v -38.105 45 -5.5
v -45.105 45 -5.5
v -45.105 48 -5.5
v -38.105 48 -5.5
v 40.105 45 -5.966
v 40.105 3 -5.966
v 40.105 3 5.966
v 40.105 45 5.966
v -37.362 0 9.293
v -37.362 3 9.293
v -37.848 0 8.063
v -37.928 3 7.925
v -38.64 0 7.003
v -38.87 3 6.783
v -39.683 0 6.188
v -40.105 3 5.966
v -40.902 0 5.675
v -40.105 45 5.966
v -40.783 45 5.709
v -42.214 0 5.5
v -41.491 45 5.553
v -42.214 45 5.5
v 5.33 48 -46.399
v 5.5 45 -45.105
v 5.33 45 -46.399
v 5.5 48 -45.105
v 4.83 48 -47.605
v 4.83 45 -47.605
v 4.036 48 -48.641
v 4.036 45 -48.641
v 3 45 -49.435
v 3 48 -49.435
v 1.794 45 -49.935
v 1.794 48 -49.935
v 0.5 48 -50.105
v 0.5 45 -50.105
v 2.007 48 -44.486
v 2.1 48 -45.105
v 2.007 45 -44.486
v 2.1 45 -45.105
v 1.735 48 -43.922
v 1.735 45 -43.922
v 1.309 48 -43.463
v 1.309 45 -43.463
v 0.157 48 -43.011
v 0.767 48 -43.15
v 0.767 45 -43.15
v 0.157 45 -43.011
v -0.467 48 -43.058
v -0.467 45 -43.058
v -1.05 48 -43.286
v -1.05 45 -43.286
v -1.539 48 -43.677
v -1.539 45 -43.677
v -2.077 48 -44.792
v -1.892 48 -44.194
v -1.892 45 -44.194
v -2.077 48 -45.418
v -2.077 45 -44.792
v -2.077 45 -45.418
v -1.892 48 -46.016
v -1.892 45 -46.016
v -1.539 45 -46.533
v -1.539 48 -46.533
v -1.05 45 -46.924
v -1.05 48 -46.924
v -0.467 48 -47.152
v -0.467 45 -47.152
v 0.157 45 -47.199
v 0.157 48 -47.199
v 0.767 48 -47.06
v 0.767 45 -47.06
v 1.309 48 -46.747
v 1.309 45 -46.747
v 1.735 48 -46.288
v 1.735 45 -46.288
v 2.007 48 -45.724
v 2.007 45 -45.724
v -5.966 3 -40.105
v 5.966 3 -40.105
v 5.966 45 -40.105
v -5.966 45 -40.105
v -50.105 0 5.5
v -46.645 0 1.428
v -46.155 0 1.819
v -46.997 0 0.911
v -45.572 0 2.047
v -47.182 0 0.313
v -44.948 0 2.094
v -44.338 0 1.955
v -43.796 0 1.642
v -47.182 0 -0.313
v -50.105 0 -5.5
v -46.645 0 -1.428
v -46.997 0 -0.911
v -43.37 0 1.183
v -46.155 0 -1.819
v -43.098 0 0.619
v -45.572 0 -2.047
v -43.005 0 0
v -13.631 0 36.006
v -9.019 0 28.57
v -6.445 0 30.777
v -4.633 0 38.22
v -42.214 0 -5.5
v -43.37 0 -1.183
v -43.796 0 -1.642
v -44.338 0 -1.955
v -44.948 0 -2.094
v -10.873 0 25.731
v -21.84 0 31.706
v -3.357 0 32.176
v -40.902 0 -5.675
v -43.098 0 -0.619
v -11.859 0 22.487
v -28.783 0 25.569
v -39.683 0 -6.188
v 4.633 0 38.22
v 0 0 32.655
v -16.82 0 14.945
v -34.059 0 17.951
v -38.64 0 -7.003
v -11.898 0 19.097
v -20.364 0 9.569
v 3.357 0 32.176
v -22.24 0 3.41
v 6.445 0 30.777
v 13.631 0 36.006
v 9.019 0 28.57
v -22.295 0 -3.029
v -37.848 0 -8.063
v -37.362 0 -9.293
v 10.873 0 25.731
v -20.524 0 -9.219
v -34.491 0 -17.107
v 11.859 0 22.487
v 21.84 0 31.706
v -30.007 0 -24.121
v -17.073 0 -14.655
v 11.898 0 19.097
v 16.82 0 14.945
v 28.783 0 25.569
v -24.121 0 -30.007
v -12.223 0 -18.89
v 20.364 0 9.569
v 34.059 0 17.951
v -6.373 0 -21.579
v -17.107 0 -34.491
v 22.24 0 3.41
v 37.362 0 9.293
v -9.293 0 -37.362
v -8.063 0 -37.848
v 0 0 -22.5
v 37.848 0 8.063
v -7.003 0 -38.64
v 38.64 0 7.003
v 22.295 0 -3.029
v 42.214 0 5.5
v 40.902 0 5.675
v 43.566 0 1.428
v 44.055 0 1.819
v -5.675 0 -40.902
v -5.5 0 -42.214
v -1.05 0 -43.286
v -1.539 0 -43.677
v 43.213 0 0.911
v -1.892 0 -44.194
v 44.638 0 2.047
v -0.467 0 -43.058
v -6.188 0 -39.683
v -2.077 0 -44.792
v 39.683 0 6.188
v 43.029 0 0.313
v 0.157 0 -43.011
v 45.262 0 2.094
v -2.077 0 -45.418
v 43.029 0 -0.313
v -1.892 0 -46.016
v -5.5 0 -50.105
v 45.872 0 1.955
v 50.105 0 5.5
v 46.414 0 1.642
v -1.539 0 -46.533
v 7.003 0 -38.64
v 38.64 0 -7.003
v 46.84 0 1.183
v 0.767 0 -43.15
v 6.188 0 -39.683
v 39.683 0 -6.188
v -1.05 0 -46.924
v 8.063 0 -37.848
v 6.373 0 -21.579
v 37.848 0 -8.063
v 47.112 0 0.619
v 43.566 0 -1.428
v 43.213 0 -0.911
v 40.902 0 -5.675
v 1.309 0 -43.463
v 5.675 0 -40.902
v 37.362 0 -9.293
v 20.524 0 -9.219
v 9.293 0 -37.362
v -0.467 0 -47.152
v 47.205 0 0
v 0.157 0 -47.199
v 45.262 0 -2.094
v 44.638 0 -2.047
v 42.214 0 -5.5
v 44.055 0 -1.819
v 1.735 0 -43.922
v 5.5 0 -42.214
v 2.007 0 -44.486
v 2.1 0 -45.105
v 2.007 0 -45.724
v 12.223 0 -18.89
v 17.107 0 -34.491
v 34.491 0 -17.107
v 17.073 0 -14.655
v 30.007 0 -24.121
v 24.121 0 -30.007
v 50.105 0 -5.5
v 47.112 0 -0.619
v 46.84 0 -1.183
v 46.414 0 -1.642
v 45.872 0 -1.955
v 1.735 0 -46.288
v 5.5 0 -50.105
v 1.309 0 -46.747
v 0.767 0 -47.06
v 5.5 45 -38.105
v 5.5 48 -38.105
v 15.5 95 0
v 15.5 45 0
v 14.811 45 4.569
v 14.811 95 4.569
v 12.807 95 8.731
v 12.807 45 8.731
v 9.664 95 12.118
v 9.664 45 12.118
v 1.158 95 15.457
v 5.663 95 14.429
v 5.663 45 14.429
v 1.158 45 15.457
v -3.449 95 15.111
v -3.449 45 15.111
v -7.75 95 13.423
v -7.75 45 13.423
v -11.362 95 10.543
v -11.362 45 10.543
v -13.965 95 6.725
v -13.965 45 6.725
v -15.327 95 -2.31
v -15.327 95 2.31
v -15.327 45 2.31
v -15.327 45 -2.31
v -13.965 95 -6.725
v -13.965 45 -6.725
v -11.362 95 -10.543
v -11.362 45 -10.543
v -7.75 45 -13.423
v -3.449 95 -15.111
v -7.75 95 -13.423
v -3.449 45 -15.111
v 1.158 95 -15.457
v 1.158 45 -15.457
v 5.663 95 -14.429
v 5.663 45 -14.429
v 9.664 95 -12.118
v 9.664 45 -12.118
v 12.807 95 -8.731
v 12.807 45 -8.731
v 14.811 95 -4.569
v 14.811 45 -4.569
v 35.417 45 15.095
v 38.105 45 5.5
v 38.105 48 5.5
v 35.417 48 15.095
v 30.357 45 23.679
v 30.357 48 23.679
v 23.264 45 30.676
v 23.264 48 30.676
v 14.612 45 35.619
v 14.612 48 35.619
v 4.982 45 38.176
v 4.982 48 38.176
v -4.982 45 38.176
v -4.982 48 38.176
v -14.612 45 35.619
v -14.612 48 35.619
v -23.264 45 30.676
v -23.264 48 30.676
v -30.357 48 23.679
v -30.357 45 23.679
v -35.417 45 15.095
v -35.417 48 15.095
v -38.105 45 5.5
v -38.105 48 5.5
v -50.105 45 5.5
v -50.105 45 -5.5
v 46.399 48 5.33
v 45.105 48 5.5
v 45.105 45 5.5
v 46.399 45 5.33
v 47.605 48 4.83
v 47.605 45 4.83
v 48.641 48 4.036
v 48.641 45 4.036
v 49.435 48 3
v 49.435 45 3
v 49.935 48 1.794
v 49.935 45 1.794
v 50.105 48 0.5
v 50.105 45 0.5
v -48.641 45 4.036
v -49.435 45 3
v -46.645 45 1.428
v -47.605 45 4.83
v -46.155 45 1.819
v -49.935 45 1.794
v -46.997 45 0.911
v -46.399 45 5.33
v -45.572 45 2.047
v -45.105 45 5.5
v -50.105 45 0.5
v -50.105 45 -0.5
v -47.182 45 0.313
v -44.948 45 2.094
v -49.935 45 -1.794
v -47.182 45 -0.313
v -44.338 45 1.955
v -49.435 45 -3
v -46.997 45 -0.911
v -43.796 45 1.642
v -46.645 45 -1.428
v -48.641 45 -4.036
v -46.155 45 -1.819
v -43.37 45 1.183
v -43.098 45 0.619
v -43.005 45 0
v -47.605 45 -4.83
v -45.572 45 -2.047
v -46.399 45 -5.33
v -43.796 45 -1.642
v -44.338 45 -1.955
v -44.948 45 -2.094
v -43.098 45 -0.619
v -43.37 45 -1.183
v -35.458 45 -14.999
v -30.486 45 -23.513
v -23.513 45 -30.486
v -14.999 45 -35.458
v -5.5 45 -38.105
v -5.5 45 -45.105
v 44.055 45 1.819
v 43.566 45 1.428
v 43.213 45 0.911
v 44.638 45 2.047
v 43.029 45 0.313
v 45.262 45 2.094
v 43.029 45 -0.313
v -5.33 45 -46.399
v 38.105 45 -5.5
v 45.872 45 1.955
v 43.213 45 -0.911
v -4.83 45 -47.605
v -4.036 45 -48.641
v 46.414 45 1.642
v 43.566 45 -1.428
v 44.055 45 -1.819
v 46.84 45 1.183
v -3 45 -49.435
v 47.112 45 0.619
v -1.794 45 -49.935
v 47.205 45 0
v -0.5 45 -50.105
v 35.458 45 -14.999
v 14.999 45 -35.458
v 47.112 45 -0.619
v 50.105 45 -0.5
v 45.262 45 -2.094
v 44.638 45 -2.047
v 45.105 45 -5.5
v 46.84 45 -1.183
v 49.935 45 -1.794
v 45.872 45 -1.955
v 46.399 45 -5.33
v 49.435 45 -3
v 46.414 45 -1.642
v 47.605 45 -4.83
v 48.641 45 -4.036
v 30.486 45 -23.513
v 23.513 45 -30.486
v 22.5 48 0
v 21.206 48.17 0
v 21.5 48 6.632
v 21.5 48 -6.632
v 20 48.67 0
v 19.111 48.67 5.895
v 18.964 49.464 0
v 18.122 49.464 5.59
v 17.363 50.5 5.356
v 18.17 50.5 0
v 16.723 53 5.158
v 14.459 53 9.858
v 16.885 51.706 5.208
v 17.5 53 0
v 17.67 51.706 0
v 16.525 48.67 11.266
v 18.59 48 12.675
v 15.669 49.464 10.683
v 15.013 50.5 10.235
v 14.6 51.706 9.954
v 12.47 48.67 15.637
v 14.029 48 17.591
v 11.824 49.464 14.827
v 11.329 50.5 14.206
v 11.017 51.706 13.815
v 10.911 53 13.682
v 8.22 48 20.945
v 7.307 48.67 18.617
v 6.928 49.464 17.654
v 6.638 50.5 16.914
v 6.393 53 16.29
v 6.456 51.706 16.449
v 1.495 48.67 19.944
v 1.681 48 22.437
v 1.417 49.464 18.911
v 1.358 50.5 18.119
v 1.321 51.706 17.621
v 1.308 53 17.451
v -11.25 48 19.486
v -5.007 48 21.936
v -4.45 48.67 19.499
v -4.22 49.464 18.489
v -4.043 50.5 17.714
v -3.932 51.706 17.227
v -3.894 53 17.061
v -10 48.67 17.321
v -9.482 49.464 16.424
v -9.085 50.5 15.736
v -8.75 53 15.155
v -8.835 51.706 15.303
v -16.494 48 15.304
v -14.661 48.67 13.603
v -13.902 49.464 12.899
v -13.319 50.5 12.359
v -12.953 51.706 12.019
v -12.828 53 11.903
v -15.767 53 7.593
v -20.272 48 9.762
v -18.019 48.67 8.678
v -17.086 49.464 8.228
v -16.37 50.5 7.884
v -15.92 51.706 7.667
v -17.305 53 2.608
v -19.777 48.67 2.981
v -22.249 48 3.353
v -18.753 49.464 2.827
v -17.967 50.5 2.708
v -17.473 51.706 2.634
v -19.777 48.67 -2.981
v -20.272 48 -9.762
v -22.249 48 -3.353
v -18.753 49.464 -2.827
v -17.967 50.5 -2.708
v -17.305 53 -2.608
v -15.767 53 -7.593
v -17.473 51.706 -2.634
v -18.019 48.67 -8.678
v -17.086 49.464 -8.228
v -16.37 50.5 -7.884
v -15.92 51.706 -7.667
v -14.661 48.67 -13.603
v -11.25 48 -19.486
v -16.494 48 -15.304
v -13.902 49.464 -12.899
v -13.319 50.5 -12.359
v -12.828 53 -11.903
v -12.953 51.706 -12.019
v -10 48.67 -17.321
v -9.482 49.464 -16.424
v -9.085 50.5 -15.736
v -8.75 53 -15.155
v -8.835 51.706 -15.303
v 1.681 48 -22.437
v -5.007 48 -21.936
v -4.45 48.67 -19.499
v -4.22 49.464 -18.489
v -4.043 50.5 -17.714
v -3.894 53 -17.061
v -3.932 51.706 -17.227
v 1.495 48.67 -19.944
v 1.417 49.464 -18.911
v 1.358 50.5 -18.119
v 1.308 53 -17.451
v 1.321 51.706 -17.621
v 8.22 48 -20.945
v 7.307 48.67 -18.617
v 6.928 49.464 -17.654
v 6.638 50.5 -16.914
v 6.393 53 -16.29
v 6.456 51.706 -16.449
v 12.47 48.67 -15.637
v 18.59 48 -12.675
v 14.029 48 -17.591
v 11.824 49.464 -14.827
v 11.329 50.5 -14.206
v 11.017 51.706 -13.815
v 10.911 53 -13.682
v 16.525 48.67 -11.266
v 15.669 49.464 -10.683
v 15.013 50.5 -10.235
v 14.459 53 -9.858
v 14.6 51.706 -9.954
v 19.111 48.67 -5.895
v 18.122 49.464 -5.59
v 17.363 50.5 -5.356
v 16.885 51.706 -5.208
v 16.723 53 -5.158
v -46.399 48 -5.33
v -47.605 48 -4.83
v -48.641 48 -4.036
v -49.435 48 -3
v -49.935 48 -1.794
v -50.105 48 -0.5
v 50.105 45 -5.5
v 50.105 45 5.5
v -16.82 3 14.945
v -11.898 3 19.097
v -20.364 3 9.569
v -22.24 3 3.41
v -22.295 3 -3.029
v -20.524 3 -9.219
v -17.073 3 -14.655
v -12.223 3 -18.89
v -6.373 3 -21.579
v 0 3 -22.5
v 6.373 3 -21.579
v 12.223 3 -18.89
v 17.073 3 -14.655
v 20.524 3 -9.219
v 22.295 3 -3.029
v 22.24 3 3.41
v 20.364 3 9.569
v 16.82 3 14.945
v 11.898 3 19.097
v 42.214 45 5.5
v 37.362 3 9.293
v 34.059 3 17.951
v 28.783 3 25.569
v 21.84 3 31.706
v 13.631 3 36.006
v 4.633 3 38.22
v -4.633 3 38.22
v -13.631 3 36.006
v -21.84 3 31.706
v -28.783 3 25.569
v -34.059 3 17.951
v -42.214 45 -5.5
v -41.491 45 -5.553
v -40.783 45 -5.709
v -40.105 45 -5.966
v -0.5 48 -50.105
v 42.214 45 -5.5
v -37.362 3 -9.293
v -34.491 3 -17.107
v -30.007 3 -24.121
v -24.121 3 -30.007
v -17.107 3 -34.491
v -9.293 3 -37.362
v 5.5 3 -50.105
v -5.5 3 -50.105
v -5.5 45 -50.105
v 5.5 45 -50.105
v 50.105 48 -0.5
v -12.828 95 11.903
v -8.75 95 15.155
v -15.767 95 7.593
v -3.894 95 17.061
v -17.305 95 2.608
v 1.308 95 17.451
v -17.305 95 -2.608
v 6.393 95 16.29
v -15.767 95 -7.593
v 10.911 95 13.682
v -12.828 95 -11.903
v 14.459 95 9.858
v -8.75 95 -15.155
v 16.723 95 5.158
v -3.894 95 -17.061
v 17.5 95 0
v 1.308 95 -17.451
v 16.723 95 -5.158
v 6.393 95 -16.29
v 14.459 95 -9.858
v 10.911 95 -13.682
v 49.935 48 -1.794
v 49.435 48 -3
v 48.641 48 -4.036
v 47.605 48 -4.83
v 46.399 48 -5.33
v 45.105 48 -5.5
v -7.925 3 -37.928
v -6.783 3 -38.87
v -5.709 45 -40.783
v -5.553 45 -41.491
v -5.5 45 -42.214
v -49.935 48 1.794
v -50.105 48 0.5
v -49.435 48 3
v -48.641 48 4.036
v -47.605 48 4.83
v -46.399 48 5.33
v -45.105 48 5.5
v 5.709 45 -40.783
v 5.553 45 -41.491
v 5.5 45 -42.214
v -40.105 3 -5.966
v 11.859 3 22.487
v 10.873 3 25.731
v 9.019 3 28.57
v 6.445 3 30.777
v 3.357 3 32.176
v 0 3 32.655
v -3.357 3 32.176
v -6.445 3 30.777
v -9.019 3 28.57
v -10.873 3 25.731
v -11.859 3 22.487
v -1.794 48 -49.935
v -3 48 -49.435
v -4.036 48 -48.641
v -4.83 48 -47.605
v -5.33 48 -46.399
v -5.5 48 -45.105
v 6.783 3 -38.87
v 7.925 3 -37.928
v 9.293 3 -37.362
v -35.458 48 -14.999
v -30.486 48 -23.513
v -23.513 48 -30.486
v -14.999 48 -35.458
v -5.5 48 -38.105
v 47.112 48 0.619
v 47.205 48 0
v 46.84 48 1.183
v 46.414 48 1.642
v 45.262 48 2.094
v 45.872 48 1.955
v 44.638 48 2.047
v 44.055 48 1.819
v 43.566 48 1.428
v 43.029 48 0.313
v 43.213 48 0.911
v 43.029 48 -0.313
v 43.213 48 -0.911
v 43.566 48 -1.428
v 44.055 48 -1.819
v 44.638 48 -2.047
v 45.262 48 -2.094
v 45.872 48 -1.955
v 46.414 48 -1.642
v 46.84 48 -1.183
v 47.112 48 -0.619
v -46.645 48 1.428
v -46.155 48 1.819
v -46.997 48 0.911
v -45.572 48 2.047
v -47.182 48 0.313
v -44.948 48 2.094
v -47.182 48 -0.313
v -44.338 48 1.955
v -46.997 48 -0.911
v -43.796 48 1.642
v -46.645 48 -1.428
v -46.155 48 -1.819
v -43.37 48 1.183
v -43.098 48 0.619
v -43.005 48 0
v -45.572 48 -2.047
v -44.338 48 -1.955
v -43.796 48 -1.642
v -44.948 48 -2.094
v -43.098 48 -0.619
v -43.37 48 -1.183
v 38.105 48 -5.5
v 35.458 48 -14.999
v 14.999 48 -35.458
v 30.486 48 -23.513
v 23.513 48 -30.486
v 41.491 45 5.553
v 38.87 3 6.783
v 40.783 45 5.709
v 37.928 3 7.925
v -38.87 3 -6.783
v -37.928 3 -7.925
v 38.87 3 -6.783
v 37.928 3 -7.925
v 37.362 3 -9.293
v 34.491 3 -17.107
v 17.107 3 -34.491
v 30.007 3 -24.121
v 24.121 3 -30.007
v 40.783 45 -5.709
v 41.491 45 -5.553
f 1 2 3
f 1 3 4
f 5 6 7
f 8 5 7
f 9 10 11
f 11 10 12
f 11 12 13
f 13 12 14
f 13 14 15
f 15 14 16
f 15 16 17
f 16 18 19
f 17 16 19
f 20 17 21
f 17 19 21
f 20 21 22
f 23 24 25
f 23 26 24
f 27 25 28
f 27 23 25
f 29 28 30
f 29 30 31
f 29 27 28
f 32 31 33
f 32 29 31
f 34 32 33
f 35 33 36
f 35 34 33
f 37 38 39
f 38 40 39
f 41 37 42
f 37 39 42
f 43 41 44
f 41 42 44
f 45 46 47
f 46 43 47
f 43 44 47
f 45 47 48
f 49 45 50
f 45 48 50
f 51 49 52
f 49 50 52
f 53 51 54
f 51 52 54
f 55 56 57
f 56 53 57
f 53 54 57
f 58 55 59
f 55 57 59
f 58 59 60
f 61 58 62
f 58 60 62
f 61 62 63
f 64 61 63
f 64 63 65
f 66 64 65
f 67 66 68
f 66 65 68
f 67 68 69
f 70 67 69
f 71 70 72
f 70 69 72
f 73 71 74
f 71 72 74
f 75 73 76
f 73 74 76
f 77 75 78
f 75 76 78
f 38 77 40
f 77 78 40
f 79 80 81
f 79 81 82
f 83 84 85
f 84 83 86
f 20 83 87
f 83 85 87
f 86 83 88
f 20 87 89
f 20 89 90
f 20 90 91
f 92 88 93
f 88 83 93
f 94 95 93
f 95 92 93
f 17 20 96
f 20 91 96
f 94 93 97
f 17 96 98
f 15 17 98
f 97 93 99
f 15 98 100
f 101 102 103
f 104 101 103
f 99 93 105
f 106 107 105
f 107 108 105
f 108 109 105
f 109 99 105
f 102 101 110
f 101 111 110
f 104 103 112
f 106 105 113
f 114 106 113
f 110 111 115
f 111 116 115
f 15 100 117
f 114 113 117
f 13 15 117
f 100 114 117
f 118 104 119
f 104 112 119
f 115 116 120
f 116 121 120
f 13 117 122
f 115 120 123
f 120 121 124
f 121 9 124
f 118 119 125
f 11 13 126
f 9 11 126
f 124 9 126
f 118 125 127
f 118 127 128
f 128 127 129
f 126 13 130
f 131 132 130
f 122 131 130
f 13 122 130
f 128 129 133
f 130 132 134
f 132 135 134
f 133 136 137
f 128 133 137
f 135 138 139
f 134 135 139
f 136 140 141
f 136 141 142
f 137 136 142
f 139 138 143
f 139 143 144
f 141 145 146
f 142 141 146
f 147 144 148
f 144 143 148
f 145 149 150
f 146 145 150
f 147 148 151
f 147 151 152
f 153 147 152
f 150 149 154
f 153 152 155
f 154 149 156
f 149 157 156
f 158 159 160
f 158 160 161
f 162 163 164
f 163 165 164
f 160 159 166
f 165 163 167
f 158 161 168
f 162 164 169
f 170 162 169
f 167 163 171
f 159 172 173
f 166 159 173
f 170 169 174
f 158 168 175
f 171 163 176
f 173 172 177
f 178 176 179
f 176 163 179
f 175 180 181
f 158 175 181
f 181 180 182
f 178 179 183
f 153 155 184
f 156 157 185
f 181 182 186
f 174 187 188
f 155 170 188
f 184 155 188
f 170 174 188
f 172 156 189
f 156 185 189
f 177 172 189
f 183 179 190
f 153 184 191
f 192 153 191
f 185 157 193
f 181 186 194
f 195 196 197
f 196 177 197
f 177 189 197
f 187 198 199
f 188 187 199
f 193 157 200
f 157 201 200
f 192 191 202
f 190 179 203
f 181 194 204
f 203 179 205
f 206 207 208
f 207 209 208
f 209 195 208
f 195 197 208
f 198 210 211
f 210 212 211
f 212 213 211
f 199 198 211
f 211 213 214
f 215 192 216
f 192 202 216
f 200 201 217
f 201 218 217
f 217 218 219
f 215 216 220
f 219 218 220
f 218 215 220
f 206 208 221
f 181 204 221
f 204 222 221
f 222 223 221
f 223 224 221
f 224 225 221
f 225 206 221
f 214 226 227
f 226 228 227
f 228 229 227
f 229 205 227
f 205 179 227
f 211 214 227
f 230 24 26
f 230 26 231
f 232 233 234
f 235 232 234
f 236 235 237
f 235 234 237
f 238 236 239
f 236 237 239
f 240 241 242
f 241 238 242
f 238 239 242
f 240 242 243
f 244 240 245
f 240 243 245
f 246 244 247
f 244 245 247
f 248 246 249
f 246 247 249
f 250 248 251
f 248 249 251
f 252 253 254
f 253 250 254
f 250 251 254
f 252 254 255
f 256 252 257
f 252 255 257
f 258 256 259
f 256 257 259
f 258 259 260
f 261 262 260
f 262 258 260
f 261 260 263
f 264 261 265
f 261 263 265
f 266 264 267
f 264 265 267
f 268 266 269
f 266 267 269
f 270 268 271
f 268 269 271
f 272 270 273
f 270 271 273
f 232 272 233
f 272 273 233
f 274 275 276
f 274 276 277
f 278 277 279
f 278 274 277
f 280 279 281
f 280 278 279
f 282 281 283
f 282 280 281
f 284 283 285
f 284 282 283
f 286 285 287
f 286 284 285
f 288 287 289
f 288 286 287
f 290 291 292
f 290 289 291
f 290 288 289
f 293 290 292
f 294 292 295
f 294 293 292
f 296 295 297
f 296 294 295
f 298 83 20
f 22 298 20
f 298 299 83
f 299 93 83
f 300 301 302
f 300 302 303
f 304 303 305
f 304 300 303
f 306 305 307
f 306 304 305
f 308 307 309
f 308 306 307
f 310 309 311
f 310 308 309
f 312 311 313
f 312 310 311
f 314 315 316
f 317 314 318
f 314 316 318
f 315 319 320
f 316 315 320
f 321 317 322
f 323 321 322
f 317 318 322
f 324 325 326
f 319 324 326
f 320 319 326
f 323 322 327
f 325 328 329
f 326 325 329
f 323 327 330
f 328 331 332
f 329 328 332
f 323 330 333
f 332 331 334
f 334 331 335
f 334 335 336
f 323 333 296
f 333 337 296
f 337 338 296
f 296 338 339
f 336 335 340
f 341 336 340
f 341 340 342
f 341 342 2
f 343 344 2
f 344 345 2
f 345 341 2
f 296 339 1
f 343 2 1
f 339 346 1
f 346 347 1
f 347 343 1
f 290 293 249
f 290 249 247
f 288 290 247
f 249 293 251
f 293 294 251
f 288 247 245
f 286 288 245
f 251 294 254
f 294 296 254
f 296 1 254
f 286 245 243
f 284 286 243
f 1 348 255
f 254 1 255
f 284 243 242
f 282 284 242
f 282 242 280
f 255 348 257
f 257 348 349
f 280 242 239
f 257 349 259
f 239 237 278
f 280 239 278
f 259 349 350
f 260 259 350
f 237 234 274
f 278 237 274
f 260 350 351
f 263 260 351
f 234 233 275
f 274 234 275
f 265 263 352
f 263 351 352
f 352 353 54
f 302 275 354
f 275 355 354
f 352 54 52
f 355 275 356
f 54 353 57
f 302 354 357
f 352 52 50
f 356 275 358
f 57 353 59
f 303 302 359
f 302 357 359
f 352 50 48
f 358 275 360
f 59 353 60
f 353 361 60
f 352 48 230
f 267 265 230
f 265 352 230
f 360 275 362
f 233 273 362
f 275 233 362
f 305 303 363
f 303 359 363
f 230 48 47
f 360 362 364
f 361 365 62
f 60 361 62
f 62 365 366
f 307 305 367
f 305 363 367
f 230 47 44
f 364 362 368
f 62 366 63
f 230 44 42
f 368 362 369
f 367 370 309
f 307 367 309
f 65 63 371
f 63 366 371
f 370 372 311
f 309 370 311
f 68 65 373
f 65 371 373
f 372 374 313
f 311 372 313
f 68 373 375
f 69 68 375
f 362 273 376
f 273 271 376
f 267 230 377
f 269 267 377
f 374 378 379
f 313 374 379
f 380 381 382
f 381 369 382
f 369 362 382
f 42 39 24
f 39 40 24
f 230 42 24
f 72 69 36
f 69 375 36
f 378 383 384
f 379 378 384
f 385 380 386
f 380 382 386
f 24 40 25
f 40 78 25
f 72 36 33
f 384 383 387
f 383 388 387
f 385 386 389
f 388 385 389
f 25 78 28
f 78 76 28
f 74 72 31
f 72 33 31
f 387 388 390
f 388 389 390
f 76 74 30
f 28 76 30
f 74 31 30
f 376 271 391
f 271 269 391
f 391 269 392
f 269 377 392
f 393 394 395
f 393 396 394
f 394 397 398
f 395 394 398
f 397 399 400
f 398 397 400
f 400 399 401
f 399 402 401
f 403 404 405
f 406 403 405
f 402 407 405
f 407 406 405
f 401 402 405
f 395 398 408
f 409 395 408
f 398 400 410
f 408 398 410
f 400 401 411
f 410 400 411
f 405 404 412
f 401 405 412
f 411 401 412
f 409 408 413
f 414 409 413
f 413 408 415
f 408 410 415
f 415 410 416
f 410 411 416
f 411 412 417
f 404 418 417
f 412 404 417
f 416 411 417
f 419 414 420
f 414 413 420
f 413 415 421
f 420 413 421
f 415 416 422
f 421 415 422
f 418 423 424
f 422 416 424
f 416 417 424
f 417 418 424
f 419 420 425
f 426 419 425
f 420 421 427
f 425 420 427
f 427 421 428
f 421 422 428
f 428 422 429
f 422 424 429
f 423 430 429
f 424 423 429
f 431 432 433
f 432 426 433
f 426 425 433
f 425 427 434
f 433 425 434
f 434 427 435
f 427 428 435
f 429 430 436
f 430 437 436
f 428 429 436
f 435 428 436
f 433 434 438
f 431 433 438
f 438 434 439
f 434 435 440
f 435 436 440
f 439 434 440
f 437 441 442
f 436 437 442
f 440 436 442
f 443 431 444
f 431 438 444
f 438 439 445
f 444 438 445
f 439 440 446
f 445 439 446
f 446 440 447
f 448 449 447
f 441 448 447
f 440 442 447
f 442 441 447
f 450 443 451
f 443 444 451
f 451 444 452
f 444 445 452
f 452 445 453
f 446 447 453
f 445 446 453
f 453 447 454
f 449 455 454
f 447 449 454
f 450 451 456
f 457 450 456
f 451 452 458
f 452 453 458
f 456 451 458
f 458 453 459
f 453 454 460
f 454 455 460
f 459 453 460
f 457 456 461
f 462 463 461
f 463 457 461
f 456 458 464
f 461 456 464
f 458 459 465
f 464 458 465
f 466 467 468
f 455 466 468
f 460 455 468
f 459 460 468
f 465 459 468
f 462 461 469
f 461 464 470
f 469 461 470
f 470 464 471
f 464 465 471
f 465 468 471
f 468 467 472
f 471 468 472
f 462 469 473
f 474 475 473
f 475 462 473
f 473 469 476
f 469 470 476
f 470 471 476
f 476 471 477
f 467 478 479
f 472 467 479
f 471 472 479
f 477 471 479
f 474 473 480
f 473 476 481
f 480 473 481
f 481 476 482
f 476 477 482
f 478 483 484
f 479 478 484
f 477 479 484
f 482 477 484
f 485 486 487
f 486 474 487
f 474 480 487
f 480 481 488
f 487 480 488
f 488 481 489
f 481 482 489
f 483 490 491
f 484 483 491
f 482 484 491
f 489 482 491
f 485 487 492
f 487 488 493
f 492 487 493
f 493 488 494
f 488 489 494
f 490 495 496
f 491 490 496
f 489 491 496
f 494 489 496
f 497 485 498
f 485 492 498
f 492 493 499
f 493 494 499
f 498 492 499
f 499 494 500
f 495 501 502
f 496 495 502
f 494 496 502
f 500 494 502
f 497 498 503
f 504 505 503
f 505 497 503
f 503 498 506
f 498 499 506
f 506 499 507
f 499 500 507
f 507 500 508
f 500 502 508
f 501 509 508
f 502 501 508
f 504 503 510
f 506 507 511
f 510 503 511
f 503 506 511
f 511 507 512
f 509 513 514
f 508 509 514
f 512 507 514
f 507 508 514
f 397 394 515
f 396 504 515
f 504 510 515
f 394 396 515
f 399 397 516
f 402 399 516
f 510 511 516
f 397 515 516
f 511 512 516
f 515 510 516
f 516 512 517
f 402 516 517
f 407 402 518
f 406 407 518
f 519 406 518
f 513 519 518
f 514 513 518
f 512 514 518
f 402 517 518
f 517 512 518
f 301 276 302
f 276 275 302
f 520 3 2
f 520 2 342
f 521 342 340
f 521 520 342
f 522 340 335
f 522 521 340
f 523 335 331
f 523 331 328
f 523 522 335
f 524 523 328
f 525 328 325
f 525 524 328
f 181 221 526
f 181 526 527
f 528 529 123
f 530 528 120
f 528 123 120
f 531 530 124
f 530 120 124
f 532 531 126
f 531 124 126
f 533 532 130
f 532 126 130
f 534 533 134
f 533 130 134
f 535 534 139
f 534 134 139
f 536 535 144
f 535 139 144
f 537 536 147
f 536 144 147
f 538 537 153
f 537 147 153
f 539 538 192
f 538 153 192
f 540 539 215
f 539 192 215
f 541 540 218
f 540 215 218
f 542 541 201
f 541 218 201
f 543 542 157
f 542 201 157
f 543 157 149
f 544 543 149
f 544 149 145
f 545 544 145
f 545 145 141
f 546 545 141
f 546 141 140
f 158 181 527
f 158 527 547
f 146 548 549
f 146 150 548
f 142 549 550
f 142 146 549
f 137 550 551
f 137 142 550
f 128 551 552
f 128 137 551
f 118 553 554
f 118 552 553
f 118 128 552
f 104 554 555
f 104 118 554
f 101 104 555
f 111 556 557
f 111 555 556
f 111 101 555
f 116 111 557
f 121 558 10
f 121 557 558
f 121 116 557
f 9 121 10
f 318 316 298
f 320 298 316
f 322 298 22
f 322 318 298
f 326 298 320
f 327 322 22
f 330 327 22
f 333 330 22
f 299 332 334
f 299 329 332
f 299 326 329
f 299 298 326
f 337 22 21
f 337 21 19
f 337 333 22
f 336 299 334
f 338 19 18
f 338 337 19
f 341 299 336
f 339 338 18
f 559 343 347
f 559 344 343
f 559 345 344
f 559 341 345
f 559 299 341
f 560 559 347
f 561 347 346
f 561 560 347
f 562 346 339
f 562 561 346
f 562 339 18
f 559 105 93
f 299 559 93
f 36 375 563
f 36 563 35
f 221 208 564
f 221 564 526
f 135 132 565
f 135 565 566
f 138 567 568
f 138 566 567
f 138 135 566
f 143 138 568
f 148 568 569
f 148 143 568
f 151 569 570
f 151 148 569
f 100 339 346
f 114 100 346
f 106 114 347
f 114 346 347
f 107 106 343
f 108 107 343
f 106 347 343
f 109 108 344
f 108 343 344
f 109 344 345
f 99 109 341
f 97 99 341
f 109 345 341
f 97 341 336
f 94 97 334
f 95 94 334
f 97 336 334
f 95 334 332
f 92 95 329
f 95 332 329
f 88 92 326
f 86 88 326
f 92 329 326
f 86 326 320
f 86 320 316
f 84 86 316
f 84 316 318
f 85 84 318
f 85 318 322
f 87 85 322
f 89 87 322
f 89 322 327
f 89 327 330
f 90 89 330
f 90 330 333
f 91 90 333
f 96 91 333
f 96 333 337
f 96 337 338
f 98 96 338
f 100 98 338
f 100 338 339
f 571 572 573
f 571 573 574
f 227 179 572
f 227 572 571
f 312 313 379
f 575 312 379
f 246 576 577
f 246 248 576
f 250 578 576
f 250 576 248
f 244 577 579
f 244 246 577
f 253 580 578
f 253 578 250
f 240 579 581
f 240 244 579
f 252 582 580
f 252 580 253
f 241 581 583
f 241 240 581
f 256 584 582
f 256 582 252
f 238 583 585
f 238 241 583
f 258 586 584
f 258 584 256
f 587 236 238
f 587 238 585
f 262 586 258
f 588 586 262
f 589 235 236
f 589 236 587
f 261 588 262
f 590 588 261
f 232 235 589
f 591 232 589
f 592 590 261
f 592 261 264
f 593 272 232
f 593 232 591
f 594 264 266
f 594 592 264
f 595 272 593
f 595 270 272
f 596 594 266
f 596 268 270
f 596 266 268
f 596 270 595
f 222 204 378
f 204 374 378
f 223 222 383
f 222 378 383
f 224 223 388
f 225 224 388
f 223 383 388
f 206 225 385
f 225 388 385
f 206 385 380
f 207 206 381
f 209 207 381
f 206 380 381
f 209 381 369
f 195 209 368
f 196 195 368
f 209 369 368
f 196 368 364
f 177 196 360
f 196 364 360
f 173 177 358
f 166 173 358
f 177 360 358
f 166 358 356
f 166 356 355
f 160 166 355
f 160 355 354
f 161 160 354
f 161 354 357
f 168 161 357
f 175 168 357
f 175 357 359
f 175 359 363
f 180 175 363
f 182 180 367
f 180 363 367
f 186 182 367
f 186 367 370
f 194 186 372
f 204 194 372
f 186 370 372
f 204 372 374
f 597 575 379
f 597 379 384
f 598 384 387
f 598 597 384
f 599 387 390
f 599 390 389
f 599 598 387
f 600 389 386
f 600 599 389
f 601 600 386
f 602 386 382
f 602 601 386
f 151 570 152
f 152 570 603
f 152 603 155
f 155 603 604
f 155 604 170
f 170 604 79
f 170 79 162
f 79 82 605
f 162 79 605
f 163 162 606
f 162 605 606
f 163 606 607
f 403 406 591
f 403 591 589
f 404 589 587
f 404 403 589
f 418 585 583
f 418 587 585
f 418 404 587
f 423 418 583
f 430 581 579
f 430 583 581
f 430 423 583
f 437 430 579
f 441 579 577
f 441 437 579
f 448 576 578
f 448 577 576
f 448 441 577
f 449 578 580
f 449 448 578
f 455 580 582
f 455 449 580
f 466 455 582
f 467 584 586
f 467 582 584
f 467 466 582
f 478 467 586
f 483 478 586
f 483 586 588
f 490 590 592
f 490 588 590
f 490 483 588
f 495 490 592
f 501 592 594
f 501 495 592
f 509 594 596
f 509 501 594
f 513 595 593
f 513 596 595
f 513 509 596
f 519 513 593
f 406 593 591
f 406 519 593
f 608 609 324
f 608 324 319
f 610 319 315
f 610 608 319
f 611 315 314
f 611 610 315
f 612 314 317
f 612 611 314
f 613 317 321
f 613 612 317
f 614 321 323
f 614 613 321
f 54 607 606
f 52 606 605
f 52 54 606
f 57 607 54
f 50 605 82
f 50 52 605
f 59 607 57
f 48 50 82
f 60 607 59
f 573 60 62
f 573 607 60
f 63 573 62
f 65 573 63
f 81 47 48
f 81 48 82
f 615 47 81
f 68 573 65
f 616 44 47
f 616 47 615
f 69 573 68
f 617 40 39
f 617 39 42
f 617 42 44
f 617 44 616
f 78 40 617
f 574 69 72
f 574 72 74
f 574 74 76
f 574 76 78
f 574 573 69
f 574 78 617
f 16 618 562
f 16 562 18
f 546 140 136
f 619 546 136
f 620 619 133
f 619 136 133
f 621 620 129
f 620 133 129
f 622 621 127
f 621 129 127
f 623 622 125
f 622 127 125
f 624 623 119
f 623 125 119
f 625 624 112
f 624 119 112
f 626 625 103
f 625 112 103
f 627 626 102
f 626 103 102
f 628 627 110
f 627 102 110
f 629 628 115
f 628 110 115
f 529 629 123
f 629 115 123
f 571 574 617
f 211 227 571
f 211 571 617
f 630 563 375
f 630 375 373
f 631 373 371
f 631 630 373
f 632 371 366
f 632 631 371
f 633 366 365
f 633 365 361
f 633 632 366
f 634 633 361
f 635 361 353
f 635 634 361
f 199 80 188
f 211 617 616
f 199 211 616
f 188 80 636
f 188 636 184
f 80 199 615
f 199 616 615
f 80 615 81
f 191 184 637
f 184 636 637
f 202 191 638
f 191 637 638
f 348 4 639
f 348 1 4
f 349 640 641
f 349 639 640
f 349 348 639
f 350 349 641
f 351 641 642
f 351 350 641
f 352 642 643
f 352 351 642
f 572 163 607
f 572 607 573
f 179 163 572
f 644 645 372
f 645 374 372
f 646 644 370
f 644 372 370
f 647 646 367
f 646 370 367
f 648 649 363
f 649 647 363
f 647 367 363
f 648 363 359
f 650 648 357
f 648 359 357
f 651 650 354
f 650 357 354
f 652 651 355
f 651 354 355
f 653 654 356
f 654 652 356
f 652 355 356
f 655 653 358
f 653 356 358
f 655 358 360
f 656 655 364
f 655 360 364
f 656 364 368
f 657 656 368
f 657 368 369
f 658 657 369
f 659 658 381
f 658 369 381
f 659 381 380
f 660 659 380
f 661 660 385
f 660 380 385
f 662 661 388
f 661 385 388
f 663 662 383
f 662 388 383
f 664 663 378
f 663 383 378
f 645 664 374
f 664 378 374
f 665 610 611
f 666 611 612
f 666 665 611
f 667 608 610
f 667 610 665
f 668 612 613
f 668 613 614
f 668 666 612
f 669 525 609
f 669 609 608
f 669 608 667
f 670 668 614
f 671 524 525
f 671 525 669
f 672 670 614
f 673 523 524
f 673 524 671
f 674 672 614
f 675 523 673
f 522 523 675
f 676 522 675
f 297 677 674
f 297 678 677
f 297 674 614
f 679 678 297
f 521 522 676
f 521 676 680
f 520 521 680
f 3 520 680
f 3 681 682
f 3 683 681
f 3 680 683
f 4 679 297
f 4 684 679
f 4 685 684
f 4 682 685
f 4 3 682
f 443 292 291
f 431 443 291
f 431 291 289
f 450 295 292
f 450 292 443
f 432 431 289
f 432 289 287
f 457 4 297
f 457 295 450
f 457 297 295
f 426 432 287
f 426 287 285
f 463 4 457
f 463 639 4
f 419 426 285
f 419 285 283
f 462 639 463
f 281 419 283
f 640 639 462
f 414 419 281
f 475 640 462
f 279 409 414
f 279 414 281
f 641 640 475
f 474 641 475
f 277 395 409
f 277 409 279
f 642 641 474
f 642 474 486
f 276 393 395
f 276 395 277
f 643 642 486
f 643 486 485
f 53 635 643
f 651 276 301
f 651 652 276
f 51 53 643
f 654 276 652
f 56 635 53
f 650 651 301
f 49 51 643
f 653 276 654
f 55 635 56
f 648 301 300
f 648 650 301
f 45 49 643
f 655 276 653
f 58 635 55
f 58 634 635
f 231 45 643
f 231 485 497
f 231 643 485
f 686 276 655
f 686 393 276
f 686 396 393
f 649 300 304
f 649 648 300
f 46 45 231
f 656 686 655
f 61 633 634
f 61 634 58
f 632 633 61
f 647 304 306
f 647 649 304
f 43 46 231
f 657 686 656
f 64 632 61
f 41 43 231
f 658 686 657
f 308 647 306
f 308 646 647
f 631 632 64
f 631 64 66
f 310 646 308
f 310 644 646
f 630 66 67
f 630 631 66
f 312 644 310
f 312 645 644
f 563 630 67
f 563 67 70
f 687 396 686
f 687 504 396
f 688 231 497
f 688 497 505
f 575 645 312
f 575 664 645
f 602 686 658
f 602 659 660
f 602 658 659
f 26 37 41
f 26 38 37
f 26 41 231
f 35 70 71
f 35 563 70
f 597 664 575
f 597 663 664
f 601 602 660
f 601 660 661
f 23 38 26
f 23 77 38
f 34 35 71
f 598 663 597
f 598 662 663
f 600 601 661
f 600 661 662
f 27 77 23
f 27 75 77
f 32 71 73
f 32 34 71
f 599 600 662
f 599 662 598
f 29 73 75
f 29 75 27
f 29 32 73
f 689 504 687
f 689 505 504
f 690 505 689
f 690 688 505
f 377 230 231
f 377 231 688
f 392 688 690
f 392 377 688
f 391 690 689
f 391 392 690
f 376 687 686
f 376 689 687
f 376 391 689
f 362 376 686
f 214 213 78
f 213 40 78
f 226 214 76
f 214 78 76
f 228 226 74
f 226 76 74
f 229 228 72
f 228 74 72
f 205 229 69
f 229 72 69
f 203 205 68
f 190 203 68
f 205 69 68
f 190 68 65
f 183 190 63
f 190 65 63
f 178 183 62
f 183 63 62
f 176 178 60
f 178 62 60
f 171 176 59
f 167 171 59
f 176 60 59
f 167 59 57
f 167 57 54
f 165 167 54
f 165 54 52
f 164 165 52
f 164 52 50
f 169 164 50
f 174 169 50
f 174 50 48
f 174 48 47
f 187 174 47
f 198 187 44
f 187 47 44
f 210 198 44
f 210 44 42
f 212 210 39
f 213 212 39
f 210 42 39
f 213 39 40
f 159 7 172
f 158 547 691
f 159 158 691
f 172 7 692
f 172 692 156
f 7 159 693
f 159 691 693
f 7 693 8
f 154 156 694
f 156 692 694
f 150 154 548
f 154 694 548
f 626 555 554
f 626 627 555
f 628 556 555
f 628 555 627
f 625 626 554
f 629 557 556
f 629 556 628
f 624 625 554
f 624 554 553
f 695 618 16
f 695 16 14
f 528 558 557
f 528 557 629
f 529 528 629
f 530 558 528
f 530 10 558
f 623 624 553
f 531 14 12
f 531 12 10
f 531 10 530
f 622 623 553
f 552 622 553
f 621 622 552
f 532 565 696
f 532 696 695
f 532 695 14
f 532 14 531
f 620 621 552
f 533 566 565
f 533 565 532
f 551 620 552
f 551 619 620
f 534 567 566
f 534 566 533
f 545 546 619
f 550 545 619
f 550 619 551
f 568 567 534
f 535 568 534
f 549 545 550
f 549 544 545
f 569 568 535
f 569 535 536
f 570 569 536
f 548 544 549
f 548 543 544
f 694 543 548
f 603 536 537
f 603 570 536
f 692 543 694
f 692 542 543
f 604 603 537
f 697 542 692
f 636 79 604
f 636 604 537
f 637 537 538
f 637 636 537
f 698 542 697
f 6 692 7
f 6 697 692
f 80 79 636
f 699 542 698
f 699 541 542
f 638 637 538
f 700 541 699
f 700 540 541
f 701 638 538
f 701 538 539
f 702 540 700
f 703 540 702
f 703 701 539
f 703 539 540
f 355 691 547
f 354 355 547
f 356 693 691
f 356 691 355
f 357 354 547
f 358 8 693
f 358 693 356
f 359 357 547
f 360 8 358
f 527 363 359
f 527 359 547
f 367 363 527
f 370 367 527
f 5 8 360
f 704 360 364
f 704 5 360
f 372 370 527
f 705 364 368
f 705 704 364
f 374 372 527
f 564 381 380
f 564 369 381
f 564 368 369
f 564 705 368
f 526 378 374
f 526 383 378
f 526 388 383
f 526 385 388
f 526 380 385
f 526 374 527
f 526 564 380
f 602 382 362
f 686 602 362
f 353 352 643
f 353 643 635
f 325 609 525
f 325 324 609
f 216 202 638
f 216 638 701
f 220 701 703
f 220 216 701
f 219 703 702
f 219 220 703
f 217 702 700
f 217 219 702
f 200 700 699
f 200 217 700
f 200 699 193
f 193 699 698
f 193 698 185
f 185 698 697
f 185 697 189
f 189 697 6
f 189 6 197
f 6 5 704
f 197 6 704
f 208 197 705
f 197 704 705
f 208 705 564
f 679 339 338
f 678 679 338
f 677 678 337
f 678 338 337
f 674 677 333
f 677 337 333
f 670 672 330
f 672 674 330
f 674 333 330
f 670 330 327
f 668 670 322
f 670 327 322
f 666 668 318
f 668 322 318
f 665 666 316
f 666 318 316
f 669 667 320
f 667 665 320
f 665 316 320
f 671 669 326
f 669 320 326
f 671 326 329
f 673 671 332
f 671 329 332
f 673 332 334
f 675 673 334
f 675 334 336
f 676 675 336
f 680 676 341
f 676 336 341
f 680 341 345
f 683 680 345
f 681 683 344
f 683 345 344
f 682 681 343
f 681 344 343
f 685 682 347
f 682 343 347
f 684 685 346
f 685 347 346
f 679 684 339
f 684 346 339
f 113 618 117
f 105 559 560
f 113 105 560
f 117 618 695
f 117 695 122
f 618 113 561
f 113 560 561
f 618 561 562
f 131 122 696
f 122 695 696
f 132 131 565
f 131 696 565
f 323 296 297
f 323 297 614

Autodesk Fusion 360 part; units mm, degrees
sketch "Sketch1" plane through (0, 0, 0) normal (0, 1, 0) x (1, 0, 0)
  circle A0 centre (0, 0) radius 22.5
  circle A1 centre (0, 0) radius 38.5
  line L0 (0, 0) -> (0, 100.2102) construction
  line L1 (0, 0) -> (100.2102, 0) construction
  line L2 (38.1051, 5.5) -> (50.1051, 5.5)
  line L3 (50.1051, 5.5) -> (50.1051, -5.5)
  line L4 (50.1051, -5.5) -> (38.1051, -5.5)
  line L5 (-50.1051, -5.5) -> (-38.1051, -5.5)
  line L6 (-38.1051, 5.5) -> (-50.1051, 5.5)
  line L7 (-50.1051, 5.5) -> (-50.1051, -5.5)
  line L8 (-5.5, 50.1051) -> (5.5, 50.1051)
  line L9 (5.5, 50.1051) -> (5.5, 38.1051)
  line L10 (-5.5, 38.1051) -> (-5.5, 50.1051)
  line L11 (0, 0) -> (0, -42.9261) construction
  circle A2 centre (0, -20.6548) radius 12
  dimension "d1" = 45
  dimension "d2" = 16
  dimension "d4" = 11
  dimension "d5" = 12
  dimension "d8" = 24
extrude "Extrude1" add sketch "Sketch1" along normal blind 3 makes body 1 in component "Body"
ref_plane "WorkPlane1" through (0, 3, -5.8026) normal (0, 1, 0) x (1, 0, 0)
sketch "Sketch2" plane through (0, 3, -5.8026) normal (0, 1, 0) x (1, 0, 0)
  line L0 (-5.5, 44.3026) -> (5.5, 44.3026)
  line L1 (5.5, 44.3026) -> (5.5, 34.3026)
  line L2 (5.5, 34.3026) -> (-5.5, 34.3026)
  line L3 (-5.5, 34.3026) -> (-5.5, 44.3026)
  line L4 (-50.1051, -0.3026) -> (-40.1051, -0.3026)
  line L5 (-40.1051, -0.3026) -> (-40.1051, -11.3026)
  line L6 (-40.1051, -11.3026) -> (-50.1051, -11.3026)
  line L7 (-50.1051, -11.3026) -> (-50.1051, -0.3026)
  line L8 (0, 0) -> (0, 69.9083) construction
  line L9 (50.1051, -11.3026) -> (50.1051, -0.3026)
  line L10 (40.1051, -0.3026) -> (40.1051, -11.3026)
  line L11 (40.1051, -11.3026) -> (50.1051, -11.3026)
  line L12 (50.1051, -0.3026) -> (40.1051, -0.3026)
  point P0 (-5.5, 44.3026)
  point P1 (5.5, 44.3026)
  point P2 (-50.1051, -11.3026)
  point P3 (-50.1051, -0.3026)
  point P4 (50.1051, -0.3026)
  point P5 (50.1051, -11.3026)
  dimension "d10" = 10
extrude "Extrude2" add sketch "Sketch2" along normal blind 42 bodies 1 in component "Body"
ref_plane "WorkPlane2" through (0, 45, -45.1051) normal (0, 1, 0) x (0, 0, 1)
sketch "Sketch3" plane through (0, 45, -45.1051) normal (0, 1, 0) x (1, 0, 0)
  circle A0 centre (0, 0) radius 2.1
  line L0 (-45.1051, -39.6051) -> (-45.1051, -50.6051) construction
  line L1 (-50.1051, -45.1051) -> (-40.1051, -45.1051) construction
  line L2 (-40.1051, -39.6051) -> (-50.1051, -39.6051) construction
  line L3 (-50.1051, -50.6051) -> (-40.1051, -50.6051) construction
  line L4 (-50.1051, -39.6051) -> (-50.1051, -50.6051) construction
  line L5 (-40.1051, -50.6051) -> (-40.1051, -39.6051) construction
  circle A1 centre (-45.1051, -45.1051) radius 2.1
  line L6 (0, 33.7384) -> (0, -58.8388)
  circle A2 centre (45.1051, -45.1051) radius 2.1
  dimension "d14" = 4.2
extrude "Extrude3" cut sketch "Sketch3" against normal up to surface (45 mm away) bodies 1 in component "Body"
ref_plane "WorkPlane3" through (0, 45, -45.1051) normal (0, 1, 0) x (0, 0, 1)
sketch "Sketch4" plane through (0, 45, -45.1051) normal (0, 1, 0) x (1, 0, 0)
  circle A0 centre (0, -45.1051) radius 38.5
  arc A1 (-5.5, -7) -> (-38.1051, -39.6051) centre (0, -45.1051) ccw
  line L0 (-5.5, 5) -> (5.5, 5)
  line L1 (5.5, 5) -> (5.5, -7)
  line L2 (-5.5, -7) -> (-5.5, 5)
  line L3 (-50.1051, -39.6051) -> (-38.1051, -39.6051)
  line L4 (-38.1051, -50.6051) -> (-50.1051, -50.6051)
  line L5 (-50.1051, -50.6051) -> (-50.1051, -39.6051)
  line L6 (0, -45.1051) -> (0, 55.1083) construction
  circle A2 centre (-45.1051, -45.1051) radius 2.1
  circle A3 centre (-45.1051, -45.1051) radius 2.1
  circle A4 centre (0, 0) radius 2.1
  circle A5 centre (45.1051, -45.1051) radius 2.1
  line L7 (50.1051, -39.6051) -> (38.1051, -39.6051)
  circle A6 centre (45.1051, -45.1051) radius 2.1
  line L8 (38.1051, -50.6051) -> (50.1051, -50.6051)
  line L9 (50.1051, -50.6051) -> (50.1051, -39.6051)
  circle A7 centre (0, -45.1051) radius 15.5
  circle A8 centre (0, -45.1051) radius 17.5
  circle A9 centre (0, 0) radius 2.1
  point P0 (-5.5, 5)
  point P1 (5.5, 5)
  point P2 (-50.1051, -39.6051)
  point P3 (-50.1051, -50.6051)
  point P4 (50.1051, -50.6051)
  point P5 (38.1051, -39.6051)
  point P6 (50.1051, -39.6051)
  dimension "d28" = 2
  dimension "d29" = 35
extrude "Extrude2'" add sketch "Sketch4" along normal blind 50 separate body contours A8 makes body 2
extrude "Extrude1'" add sketch "Sketch4" along normal blind 3 contours A0 A1 | A0 L7 L8 L9 | A0 L0 L1 L2 | A0 L3 L4 L5 bodies 2
copy_body "Body->Comp1" bodies 2 removing the originals makes body 3 in component "Top"
fillet "Fillet1" radius 5 6 edges at (50.1051, 46.5, 5.5) (50.1051, 46.5, -5.5) (-5.5, 46.5, -50.1051) (5.5, 46.5, -50.1051) (-50.1051, 46.5, -5.5) (-50.1051, 46.5, 5.5) on bodies 3 in component "Top"
fillet "Fillet2" radius 5 1 edges at (-16.3157, 48, 6.3283) on bodies 3 in component "Top"
fillet "Fillet3" radius 5 6 edges at (38.1051, 1.5, 5.5) (38.1051, 1.5, -5.5) (5.5, 1.5, -38.1051) (-5.5, 1.5, -38.1051) (-38.1051, 1.5, -5.5) (-38.1051, 1.5, 5.5) on bodies 1 in component "Body"
component "Body" placed x (1, 0, 0) y (0, 1, 0) z (0, 0, 1) at (0, 0, 0)
component "Top" placed x (1, 0, 0) y (0, 1, 0) z (0, 0, 1) at (0, 0, 0)
